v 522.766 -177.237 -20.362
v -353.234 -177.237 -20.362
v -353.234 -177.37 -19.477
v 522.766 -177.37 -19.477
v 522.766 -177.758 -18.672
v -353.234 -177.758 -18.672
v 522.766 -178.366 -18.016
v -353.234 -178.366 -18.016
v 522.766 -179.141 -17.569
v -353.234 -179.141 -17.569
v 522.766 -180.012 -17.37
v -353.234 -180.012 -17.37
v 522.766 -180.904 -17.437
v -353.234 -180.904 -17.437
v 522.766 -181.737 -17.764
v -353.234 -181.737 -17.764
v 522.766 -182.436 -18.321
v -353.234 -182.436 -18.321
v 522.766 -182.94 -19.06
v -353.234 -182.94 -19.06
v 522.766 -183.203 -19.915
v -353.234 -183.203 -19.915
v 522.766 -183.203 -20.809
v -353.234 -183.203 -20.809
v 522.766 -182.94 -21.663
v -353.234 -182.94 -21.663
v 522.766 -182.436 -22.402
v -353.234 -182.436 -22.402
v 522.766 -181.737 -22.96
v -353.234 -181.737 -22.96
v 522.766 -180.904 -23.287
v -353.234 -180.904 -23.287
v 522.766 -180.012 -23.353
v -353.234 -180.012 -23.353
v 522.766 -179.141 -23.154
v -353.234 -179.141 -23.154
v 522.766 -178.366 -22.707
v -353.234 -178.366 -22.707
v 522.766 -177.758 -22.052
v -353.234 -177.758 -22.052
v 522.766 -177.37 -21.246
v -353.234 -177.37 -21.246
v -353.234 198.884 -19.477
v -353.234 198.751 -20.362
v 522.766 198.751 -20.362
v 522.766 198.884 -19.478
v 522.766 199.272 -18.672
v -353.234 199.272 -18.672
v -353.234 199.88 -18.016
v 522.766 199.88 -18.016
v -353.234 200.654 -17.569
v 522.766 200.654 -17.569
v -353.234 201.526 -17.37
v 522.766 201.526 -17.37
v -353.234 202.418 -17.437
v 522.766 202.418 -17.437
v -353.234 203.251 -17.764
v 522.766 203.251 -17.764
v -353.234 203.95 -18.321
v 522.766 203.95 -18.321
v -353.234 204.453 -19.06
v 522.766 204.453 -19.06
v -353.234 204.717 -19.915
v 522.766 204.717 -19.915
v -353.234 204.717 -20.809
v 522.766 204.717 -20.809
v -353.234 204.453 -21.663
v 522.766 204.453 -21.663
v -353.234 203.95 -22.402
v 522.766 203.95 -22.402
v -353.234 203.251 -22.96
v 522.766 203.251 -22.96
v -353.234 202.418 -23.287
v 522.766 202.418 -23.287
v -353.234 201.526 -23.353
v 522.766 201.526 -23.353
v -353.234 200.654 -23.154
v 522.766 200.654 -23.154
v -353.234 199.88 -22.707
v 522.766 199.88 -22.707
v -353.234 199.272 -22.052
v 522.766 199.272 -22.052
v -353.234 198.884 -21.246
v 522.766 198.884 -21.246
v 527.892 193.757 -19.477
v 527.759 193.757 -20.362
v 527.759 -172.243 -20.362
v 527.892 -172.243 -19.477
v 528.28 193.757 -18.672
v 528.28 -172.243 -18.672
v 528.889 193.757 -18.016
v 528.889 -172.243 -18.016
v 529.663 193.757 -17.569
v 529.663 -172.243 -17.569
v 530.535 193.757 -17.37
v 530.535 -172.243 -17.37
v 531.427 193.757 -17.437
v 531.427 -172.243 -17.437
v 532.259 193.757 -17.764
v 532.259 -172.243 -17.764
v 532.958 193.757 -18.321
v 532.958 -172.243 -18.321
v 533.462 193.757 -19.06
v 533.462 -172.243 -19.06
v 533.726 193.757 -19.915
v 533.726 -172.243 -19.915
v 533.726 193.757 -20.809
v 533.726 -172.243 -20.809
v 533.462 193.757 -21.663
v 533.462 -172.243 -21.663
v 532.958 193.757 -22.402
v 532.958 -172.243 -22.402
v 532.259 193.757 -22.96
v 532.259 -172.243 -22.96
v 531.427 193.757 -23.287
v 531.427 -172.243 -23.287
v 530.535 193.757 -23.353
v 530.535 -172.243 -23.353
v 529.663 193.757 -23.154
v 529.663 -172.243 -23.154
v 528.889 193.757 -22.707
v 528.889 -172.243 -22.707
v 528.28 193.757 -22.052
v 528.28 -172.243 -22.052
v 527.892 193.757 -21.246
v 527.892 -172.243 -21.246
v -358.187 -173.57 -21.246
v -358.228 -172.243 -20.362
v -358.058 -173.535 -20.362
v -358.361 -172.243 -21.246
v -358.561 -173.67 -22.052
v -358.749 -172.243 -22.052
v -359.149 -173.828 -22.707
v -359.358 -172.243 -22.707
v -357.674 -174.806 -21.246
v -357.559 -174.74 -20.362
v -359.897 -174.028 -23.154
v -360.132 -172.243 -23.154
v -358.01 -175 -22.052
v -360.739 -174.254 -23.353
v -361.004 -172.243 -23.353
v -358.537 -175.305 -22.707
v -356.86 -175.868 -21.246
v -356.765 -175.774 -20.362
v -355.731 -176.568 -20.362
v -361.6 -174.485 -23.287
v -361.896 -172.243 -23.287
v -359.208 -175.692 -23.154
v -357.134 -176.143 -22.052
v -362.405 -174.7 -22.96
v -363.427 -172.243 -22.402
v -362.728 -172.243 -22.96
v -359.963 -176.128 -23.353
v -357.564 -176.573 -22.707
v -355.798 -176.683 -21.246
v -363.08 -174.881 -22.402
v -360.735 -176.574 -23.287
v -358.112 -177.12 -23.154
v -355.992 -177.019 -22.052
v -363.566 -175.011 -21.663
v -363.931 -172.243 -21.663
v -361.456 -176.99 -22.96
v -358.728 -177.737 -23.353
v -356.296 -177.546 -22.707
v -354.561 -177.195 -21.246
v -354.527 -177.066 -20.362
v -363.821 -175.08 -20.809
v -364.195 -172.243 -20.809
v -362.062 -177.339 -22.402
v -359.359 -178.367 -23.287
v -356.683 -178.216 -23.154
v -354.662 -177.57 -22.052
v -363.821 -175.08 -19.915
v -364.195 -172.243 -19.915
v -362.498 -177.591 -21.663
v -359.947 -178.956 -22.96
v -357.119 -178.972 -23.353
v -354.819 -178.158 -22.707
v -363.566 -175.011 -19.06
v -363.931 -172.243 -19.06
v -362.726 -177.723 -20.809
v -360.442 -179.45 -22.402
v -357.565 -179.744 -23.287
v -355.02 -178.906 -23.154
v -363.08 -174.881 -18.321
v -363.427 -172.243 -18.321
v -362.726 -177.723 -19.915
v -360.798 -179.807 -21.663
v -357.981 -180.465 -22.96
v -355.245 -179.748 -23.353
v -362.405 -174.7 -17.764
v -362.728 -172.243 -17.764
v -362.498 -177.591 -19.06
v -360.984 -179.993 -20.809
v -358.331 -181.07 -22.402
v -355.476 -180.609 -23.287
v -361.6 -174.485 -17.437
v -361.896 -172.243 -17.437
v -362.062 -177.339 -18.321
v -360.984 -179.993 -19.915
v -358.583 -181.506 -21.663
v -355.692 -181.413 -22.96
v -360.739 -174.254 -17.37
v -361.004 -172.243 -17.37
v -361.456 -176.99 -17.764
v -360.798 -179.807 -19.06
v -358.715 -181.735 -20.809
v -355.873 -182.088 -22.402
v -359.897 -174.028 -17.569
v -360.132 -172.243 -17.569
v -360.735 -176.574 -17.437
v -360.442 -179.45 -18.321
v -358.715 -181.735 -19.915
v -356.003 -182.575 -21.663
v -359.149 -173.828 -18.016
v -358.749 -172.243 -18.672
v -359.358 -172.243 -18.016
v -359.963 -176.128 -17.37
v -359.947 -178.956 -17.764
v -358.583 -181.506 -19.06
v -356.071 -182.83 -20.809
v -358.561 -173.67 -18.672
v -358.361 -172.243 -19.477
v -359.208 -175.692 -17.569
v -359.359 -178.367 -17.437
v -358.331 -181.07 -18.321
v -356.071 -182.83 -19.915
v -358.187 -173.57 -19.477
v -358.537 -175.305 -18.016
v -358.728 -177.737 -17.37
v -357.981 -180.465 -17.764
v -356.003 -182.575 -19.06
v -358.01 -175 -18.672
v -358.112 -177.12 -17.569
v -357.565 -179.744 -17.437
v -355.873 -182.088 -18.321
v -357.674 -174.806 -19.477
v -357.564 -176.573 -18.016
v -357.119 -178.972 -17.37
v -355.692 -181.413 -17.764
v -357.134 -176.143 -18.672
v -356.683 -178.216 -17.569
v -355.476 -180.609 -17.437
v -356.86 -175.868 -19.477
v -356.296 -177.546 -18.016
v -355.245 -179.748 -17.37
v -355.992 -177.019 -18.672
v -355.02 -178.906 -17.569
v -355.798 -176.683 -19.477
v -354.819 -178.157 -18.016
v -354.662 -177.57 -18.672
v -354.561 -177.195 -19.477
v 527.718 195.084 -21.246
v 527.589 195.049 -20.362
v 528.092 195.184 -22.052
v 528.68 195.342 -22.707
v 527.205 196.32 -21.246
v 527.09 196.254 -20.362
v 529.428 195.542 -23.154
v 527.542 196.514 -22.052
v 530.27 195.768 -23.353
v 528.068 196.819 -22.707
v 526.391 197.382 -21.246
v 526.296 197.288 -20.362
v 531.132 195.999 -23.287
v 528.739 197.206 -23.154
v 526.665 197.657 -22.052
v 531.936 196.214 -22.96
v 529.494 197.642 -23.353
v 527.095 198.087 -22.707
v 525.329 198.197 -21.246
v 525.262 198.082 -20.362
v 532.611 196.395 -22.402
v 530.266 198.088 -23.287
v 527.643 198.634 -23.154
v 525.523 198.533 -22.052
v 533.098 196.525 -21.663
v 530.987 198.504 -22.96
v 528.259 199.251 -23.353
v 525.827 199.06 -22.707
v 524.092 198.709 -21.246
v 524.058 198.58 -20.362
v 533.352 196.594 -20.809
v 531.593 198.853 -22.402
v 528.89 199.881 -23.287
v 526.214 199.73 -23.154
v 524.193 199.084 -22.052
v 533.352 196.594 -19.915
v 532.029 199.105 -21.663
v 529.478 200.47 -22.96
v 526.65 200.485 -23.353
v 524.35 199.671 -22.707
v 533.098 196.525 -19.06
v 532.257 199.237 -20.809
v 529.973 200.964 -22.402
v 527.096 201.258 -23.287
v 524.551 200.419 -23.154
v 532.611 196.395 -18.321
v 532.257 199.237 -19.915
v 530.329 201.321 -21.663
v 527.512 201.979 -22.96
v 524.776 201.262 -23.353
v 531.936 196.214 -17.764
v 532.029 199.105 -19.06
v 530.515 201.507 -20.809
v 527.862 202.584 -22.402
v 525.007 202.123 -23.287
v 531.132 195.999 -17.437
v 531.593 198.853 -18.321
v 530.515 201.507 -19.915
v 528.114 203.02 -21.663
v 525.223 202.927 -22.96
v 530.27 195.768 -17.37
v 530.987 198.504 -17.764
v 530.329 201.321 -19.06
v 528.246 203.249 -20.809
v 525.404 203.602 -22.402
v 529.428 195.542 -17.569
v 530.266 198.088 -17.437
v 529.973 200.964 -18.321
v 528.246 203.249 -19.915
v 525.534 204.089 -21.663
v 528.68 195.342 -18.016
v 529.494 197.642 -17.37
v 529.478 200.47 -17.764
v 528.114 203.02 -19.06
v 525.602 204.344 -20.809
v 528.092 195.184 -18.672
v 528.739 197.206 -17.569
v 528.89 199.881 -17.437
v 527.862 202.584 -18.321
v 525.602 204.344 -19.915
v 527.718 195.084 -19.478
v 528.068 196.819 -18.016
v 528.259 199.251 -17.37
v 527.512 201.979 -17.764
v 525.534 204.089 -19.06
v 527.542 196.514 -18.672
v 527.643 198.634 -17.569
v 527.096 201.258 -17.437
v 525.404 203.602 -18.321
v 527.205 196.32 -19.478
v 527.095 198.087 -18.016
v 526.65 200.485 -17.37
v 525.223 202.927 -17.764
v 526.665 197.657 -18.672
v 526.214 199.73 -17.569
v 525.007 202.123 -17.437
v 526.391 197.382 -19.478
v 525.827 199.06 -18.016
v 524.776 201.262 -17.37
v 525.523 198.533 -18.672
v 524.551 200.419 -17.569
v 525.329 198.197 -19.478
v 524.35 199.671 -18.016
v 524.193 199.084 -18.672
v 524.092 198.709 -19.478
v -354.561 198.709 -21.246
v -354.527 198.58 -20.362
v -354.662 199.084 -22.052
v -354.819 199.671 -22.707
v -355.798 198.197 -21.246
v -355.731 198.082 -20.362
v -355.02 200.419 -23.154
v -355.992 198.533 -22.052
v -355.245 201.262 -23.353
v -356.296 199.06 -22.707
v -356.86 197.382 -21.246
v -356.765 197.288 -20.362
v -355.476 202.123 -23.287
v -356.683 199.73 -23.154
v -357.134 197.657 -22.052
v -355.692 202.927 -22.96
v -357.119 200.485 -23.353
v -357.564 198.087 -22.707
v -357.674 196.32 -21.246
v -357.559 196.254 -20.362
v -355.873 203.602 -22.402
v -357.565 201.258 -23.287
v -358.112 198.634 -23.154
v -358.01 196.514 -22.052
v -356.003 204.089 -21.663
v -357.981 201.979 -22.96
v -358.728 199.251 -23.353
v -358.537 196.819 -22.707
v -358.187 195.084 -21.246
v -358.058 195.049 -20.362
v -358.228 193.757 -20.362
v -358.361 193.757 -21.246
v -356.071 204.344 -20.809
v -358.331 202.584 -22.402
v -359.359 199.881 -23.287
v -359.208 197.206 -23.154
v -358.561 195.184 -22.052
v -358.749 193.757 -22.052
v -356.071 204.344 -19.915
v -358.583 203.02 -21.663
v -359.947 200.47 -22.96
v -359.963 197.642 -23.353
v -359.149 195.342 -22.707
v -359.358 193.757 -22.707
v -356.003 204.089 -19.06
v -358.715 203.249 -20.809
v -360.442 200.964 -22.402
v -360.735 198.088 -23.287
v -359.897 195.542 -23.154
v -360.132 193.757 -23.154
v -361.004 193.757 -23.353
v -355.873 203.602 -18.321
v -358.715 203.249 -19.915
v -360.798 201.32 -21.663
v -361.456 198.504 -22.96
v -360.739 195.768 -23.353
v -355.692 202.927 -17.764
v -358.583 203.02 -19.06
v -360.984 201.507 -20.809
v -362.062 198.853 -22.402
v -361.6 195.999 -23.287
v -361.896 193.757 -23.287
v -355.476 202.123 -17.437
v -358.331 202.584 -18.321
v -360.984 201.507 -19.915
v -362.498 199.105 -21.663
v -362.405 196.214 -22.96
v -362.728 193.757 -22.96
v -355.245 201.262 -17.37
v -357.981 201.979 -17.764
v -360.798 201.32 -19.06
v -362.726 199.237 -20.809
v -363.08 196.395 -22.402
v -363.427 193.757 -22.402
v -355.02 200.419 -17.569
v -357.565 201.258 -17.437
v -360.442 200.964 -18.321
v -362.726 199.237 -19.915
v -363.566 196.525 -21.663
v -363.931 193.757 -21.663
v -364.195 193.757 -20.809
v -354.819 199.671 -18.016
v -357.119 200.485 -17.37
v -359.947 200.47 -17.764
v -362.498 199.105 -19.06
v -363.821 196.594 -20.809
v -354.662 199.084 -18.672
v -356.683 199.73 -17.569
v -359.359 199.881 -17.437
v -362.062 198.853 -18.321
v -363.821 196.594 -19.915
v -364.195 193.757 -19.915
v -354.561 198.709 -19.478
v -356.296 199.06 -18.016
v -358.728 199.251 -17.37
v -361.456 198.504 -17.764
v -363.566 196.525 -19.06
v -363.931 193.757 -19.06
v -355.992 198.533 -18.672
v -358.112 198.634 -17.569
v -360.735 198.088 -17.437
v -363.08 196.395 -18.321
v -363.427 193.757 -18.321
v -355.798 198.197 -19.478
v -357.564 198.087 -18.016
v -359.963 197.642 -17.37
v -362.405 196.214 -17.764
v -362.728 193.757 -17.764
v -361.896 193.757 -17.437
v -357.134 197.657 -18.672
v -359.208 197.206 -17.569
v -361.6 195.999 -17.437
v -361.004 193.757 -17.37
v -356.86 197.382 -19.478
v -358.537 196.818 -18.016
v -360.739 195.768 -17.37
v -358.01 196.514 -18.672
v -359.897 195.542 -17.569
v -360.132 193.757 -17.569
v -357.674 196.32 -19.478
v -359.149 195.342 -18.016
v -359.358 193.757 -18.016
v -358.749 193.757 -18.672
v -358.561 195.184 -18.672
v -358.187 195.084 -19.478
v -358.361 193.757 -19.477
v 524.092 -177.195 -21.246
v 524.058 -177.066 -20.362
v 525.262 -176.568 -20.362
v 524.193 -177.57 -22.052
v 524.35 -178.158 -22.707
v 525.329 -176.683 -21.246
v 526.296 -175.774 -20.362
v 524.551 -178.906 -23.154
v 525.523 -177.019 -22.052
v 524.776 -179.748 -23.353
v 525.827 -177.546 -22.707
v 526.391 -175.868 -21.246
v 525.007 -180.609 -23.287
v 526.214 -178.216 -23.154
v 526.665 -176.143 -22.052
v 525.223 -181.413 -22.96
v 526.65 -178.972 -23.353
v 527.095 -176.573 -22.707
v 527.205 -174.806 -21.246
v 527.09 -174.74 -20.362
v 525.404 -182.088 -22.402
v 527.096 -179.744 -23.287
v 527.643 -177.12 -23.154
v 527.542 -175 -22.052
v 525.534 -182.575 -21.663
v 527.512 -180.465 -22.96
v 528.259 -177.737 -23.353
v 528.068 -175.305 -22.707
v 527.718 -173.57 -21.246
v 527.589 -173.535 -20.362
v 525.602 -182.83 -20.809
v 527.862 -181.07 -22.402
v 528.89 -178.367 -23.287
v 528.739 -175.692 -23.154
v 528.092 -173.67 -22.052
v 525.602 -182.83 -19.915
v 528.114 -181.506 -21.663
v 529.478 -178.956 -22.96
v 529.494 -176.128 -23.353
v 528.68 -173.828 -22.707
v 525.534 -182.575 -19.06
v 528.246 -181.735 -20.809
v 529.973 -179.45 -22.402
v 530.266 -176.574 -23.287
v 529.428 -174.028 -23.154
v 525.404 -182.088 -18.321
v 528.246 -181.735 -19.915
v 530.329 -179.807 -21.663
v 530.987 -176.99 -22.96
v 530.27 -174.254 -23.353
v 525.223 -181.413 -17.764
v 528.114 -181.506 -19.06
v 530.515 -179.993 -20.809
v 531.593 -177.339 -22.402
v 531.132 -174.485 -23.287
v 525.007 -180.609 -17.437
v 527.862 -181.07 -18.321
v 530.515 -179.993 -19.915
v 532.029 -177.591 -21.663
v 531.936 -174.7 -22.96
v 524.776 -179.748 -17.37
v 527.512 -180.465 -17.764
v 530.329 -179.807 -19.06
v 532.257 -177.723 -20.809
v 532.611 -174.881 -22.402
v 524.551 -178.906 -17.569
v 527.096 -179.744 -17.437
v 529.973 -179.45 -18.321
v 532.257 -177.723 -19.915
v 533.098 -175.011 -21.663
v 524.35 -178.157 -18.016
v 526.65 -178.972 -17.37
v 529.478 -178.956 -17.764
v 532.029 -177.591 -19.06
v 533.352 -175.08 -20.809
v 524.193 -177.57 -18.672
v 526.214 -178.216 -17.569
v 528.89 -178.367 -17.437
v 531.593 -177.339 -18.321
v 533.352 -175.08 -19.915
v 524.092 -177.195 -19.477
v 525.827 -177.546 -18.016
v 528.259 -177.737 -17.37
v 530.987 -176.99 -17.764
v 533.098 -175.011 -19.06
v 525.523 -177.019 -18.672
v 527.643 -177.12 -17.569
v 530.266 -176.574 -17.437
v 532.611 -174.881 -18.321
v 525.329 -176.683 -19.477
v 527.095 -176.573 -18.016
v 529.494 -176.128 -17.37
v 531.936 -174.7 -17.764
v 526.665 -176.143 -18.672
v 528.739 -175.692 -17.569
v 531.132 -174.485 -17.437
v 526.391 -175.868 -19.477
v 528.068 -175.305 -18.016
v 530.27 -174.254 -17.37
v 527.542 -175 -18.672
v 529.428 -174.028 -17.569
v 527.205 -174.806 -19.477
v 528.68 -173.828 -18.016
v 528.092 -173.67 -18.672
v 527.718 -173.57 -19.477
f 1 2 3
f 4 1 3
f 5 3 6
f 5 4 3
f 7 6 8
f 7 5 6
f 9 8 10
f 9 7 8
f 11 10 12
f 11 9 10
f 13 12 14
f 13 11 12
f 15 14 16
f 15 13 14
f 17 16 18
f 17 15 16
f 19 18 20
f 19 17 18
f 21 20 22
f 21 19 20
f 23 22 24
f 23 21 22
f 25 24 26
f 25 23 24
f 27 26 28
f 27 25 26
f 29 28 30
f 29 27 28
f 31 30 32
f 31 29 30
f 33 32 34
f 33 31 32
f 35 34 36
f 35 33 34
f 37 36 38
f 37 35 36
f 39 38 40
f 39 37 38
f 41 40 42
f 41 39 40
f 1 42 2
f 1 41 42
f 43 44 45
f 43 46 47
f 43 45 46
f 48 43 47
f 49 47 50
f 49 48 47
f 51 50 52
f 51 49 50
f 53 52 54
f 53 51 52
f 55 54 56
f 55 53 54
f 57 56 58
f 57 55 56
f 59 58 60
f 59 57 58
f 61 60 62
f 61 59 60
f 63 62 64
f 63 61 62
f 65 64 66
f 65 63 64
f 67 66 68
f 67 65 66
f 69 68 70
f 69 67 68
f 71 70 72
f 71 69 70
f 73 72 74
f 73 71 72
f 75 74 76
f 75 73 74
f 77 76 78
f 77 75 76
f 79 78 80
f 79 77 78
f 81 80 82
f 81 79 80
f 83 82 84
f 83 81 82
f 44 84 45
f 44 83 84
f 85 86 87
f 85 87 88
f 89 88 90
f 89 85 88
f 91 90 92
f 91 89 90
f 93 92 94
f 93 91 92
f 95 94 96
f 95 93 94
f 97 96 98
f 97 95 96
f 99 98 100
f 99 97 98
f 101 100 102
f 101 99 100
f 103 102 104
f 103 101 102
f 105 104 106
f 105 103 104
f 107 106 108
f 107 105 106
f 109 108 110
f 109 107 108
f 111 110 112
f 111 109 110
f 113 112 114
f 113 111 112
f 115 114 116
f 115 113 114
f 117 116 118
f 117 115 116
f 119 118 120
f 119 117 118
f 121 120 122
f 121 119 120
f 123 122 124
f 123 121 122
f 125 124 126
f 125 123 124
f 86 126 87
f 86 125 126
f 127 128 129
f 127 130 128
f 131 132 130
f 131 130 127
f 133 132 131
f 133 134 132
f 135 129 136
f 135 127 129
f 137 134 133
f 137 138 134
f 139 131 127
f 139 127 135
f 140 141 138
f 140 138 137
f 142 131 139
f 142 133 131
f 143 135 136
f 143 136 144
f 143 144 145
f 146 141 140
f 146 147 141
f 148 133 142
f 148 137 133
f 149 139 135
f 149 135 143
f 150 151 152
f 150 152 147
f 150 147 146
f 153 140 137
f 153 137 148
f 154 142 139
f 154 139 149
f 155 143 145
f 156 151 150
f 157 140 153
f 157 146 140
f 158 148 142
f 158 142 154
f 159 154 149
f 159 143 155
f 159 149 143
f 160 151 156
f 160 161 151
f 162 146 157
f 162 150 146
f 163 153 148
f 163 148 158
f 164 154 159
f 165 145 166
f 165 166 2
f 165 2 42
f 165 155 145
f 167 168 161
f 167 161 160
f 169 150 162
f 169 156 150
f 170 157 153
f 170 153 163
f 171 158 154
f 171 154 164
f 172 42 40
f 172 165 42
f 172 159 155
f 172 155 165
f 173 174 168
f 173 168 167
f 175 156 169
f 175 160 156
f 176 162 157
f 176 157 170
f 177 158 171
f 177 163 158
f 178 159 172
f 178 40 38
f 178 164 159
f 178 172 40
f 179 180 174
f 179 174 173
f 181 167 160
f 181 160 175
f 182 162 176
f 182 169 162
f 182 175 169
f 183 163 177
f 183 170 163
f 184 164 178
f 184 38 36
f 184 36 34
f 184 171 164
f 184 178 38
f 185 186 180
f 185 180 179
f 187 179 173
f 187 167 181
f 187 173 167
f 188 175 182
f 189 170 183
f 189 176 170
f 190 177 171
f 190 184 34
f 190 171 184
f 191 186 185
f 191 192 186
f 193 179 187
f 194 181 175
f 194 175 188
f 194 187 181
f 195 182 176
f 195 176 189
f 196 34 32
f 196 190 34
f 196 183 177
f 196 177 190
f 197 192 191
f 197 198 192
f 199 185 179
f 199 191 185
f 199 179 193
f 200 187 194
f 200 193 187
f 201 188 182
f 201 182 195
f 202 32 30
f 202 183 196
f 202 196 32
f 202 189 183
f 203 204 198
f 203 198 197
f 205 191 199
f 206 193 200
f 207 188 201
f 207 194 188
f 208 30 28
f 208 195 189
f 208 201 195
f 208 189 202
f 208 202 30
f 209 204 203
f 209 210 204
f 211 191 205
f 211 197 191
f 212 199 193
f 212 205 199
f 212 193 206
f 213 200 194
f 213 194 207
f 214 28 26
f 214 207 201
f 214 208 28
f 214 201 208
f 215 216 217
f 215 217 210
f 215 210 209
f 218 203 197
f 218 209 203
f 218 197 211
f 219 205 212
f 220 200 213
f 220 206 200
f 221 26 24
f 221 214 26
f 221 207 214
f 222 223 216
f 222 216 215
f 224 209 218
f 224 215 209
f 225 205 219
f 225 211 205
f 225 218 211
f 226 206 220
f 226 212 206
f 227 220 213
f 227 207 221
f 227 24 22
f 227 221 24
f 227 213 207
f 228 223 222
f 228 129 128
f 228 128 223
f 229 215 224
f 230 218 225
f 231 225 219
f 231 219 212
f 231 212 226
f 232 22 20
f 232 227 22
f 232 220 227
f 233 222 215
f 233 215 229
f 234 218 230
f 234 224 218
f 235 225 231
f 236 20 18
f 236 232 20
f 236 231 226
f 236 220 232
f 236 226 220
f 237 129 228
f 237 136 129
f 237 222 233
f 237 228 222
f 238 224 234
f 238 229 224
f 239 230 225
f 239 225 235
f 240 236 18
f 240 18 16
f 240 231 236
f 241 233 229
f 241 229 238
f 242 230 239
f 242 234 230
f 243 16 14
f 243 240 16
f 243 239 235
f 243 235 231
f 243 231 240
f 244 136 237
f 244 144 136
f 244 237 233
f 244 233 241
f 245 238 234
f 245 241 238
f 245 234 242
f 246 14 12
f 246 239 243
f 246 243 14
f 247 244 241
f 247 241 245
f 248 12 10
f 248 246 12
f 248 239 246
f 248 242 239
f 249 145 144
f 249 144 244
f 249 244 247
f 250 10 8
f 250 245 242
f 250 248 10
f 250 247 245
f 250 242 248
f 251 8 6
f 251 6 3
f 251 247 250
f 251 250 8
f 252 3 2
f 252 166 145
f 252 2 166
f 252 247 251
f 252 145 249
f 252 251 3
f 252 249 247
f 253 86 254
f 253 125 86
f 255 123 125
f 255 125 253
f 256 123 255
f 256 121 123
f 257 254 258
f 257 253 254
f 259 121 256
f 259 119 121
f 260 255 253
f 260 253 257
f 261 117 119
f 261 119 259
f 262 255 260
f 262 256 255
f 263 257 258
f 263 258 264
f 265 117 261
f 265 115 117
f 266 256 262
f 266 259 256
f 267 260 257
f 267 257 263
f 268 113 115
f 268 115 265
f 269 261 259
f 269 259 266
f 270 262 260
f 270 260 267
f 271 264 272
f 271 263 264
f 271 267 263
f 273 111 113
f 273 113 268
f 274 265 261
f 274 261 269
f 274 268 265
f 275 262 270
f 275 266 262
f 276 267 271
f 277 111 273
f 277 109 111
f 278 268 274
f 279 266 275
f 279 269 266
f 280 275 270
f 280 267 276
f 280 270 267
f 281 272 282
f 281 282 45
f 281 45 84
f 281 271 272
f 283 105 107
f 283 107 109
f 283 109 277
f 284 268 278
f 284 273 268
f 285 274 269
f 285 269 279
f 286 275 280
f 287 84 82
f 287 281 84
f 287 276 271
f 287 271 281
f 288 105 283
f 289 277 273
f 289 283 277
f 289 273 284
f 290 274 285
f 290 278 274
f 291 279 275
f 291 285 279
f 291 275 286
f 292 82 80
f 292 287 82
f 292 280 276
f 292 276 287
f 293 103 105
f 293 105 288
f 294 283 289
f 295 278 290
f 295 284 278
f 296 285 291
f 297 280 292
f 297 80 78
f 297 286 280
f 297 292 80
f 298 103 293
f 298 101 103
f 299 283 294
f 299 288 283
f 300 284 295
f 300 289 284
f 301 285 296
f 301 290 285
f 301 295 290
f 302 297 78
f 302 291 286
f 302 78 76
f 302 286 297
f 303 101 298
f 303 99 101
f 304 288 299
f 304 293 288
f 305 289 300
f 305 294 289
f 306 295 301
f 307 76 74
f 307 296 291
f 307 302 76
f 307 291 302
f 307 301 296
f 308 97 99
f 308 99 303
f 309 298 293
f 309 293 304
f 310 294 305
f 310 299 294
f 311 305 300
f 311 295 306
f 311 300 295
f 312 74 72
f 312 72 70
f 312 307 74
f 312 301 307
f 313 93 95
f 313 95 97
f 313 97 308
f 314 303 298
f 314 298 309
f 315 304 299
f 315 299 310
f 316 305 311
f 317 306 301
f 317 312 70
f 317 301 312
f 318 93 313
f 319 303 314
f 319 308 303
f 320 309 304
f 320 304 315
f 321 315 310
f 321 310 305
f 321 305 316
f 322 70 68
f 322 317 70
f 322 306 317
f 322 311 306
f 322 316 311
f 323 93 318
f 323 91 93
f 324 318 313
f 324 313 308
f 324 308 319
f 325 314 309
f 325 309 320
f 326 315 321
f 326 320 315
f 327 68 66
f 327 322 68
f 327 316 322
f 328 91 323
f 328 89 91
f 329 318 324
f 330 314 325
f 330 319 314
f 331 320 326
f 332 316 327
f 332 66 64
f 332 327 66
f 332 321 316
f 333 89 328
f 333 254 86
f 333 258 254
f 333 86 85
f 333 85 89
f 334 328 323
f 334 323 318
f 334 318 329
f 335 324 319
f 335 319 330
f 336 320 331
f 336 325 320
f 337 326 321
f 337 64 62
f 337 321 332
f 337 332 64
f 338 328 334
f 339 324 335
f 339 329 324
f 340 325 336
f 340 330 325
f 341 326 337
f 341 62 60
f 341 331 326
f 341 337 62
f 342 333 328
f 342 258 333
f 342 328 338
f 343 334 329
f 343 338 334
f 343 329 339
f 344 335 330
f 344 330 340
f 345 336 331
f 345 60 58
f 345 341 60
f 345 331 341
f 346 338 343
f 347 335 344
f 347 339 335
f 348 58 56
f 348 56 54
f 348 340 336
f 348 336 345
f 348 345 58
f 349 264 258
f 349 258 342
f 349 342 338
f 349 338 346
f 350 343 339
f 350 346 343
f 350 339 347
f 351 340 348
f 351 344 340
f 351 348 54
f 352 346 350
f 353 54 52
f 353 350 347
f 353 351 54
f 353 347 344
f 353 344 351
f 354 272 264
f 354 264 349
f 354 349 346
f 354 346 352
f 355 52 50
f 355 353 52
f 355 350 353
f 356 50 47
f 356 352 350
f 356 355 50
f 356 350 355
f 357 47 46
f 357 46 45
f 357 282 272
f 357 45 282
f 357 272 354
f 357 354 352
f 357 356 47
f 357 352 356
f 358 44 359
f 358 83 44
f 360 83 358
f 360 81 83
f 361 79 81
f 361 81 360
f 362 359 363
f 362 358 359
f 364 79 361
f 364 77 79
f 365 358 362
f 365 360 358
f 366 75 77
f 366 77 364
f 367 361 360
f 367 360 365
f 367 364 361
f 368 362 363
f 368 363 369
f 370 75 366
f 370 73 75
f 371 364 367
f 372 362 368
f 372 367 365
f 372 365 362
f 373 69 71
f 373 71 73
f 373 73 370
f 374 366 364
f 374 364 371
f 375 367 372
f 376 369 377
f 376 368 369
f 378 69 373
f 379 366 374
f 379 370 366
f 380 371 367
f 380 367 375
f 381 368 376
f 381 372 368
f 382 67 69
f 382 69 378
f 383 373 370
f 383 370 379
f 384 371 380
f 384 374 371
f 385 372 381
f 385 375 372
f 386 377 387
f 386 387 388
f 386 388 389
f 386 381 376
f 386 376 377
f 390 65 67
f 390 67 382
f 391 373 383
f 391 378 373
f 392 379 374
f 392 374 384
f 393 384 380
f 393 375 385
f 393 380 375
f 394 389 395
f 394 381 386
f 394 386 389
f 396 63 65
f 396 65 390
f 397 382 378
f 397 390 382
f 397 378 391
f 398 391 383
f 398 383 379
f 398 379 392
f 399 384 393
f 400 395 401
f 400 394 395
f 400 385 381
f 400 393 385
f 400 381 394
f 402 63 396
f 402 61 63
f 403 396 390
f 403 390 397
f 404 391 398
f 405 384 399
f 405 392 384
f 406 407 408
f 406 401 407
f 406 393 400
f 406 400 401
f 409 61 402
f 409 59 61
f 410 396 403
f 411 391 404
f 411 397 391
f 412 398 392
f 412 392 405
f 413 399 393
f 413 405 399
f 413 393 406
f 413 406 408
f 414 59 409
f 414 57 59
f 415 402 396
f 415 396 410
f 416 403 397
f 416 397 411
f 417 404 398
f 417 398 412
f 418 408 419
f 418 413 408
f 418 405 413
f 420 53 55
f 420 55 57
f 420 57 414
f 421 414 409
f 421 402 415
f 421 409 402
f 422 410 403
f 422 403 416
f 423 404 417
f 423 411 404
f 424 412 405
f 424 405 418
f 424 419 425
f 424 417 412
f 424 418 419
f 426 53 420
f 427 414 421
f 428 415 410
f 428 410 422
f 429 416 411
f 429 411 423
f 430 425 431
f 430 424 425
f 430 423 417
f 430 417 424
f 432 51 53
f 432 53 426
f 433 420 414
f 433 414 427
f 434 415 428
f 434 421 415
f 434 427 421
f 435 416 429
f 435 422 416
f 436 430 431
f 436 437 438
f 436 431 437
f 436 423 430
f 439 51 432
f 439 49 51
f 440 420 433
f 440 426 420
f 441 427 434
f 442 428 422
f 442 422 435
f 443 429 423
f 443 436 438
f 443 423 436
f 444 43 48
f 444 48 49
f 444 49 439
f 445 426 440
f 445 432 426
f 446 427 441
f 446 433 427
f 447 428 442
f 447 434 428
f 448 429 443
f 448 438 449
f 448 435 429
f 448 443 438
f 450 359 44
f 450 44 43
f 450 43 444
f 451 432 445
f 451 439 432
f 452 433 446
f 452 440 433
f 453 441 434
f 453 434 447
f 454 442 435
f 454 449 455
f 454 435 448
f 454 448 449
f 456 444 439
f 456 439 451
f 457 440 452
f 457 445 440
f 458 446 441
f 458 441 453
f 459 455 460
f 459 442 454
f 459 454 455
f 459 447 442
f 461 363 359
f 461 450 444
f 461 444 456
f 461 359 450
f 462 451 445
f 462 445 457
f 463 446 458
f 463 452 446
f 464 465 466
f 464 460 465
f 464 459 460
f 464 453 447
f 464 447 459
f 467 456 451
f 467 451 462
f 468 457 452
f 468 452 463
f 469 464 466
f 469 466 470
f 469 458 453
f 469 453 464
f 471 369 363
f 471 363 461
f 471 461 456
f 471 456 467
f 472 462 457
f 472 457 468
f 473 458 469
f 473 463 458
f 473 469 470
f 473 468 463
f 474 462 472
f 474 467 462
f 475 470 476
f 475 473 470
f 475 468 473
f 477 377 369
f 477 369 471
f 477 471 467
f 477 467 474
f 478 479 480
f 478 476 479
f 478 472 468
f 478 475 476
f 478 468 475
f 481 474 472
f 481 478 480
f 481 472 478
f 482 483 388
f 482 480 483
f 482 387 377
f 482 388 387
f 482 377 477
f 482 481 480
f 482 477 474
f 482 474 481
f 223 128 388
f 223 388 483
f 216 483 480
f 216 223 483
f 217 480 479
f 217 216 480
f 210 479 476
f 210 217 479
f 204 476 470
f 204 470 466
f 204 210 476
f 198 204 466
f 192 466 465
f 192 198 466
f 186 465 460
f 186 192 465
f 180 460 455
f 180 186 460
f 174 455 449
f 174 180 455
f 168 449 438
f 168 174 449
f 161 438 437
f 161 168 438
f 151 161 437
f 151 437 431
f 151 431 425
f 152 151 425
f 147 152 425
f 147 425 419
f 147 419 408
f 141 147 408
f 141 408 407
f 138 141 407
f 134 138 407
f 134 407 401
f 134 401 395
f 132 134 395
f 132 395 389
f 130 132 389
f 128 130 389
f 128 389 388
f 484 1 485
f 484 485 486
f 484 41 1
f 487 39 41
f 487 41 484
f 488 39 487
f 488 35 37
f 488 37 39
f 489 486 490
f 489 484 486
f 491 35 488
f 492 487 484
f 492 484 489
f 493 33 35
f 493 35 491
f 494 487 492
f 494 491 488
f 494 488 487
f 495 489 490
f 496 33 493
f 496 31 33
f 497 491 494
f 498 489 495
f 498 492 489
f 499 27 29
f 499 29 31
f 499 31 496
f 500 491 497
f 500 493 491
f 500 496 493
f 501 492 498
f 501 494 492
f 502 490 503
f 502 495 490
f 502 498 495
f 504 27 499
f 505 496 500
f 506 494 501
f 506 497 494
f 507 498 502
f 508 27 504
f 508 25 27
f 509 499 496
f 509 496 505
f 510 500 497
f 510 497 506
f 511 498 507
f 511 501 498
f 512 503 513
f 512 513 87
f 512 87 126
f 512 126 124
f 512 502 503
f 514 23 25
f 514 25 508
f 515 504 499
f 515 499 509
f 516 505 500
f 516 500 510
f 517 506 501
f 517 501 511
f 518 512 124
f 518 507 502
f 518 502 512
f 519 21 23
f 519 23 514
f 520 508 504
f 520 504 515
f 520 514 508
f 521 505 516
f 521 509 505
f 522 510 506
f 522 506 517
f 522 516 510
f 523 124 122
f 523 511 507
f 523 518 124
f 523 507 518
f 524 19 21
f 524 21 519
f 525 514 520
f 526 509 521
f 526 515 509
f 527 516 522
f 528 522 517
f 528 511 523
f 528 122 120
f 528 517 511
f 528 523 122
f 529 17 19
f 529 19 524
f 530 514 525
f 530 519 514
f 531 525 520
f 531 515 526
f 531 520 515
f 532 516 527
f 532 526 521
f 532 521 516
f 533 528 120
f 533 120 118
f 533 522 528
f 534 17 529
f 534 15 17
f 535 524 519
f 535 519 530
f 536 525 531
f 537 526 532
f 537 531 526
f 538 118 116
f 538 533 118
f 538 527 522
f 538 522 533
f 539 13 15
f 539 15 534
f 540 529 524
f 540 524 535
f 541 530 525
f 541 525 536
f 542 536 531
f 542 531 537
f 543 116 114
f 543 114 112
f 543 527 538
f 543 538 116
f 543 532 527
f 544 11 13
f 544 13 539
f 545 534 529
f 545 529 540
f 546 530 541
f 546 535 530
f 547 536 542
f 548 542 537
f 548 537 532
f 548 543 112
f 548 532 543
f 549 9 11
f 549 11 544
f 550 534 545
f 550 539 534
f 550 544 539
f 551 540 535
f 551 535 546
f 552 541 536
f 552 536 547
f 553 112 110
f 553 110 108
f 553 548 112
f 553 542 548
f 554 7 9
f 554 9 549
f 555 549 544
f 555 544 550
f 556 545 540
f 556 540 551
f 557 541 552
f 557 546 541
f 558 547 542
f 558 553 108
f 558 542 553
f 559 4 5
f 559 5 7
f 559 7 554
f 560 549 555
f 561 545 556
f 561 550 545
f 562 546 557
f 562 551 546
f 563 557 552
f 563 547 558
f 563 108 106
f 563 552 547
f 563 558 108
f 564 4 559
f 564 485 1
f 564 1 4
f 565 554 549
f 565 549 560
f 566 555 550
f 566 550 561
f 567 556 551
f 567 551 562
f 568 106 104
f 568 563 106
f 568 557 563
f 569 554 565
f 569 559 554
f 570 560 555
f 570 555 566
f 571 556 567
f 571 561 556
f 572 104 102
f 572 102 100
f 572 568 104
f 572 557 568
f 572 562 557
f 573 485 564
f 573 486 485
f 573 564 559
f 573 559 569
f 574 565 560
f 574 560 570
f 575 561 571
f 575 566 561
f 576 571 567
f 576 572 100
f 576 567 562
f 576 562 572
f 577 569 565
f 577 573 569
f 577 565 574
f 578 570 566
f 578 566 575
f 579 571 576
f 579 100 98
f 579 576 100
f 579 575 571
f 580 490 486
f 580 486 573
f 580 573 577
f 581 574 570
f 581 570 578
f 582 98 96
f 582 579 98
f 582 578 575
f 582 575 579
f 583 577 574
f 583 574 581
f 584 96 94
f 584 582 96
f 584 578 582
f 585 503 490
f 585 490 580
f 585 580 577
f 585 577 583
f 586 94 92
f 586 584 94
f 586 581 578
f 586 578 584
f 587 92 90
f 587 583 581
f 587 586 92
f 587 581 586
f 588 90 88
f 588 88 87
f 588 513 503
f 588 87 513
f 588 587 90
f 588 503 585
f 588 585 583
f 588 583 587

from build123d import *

# Parameters (mm, degrees)
F1_R = 3


with BuildPart() as f2:
    # F2: sweep along a path in F0
    with BuildLine(Plane.XY) as f2_path:
        Line((-365.234485, 193.756955), (-365.234485, -172.243045))
        ThreePointArc((-365.234485, -172.243045), (-361.719766, -180.728326), (-353.234485, -184.243045))
        Line((-353.234485, -184.243045), (522.765515, -184.243045))
        ThreePointArc((522.765515, -184.243045), (531.250796, -180.728326), (534.765515, -172.243045))
        Line((534.765515, -172.243045), (534.765515, 193.756955))
        ThreePointArc((534.765515, 193.756955), (531.250796, 202.242236), (522.765515, 205.756955))
        Line((522.765515, 205.756955), (-353.234485, 205.756955))
        ThreePointArc((-353.234485, 205.756955), (-361.719766, 202.242236), (-365.234485, 193.756955))
    # F1 (on Front) → F2 (sweep)
    with BuildSketch(Plane.XZ):
        with Locations((-361.228049, -20.361764)):
            Circle(F1_R)
    sweep(path=f2_path.line)


solid = f2.part
